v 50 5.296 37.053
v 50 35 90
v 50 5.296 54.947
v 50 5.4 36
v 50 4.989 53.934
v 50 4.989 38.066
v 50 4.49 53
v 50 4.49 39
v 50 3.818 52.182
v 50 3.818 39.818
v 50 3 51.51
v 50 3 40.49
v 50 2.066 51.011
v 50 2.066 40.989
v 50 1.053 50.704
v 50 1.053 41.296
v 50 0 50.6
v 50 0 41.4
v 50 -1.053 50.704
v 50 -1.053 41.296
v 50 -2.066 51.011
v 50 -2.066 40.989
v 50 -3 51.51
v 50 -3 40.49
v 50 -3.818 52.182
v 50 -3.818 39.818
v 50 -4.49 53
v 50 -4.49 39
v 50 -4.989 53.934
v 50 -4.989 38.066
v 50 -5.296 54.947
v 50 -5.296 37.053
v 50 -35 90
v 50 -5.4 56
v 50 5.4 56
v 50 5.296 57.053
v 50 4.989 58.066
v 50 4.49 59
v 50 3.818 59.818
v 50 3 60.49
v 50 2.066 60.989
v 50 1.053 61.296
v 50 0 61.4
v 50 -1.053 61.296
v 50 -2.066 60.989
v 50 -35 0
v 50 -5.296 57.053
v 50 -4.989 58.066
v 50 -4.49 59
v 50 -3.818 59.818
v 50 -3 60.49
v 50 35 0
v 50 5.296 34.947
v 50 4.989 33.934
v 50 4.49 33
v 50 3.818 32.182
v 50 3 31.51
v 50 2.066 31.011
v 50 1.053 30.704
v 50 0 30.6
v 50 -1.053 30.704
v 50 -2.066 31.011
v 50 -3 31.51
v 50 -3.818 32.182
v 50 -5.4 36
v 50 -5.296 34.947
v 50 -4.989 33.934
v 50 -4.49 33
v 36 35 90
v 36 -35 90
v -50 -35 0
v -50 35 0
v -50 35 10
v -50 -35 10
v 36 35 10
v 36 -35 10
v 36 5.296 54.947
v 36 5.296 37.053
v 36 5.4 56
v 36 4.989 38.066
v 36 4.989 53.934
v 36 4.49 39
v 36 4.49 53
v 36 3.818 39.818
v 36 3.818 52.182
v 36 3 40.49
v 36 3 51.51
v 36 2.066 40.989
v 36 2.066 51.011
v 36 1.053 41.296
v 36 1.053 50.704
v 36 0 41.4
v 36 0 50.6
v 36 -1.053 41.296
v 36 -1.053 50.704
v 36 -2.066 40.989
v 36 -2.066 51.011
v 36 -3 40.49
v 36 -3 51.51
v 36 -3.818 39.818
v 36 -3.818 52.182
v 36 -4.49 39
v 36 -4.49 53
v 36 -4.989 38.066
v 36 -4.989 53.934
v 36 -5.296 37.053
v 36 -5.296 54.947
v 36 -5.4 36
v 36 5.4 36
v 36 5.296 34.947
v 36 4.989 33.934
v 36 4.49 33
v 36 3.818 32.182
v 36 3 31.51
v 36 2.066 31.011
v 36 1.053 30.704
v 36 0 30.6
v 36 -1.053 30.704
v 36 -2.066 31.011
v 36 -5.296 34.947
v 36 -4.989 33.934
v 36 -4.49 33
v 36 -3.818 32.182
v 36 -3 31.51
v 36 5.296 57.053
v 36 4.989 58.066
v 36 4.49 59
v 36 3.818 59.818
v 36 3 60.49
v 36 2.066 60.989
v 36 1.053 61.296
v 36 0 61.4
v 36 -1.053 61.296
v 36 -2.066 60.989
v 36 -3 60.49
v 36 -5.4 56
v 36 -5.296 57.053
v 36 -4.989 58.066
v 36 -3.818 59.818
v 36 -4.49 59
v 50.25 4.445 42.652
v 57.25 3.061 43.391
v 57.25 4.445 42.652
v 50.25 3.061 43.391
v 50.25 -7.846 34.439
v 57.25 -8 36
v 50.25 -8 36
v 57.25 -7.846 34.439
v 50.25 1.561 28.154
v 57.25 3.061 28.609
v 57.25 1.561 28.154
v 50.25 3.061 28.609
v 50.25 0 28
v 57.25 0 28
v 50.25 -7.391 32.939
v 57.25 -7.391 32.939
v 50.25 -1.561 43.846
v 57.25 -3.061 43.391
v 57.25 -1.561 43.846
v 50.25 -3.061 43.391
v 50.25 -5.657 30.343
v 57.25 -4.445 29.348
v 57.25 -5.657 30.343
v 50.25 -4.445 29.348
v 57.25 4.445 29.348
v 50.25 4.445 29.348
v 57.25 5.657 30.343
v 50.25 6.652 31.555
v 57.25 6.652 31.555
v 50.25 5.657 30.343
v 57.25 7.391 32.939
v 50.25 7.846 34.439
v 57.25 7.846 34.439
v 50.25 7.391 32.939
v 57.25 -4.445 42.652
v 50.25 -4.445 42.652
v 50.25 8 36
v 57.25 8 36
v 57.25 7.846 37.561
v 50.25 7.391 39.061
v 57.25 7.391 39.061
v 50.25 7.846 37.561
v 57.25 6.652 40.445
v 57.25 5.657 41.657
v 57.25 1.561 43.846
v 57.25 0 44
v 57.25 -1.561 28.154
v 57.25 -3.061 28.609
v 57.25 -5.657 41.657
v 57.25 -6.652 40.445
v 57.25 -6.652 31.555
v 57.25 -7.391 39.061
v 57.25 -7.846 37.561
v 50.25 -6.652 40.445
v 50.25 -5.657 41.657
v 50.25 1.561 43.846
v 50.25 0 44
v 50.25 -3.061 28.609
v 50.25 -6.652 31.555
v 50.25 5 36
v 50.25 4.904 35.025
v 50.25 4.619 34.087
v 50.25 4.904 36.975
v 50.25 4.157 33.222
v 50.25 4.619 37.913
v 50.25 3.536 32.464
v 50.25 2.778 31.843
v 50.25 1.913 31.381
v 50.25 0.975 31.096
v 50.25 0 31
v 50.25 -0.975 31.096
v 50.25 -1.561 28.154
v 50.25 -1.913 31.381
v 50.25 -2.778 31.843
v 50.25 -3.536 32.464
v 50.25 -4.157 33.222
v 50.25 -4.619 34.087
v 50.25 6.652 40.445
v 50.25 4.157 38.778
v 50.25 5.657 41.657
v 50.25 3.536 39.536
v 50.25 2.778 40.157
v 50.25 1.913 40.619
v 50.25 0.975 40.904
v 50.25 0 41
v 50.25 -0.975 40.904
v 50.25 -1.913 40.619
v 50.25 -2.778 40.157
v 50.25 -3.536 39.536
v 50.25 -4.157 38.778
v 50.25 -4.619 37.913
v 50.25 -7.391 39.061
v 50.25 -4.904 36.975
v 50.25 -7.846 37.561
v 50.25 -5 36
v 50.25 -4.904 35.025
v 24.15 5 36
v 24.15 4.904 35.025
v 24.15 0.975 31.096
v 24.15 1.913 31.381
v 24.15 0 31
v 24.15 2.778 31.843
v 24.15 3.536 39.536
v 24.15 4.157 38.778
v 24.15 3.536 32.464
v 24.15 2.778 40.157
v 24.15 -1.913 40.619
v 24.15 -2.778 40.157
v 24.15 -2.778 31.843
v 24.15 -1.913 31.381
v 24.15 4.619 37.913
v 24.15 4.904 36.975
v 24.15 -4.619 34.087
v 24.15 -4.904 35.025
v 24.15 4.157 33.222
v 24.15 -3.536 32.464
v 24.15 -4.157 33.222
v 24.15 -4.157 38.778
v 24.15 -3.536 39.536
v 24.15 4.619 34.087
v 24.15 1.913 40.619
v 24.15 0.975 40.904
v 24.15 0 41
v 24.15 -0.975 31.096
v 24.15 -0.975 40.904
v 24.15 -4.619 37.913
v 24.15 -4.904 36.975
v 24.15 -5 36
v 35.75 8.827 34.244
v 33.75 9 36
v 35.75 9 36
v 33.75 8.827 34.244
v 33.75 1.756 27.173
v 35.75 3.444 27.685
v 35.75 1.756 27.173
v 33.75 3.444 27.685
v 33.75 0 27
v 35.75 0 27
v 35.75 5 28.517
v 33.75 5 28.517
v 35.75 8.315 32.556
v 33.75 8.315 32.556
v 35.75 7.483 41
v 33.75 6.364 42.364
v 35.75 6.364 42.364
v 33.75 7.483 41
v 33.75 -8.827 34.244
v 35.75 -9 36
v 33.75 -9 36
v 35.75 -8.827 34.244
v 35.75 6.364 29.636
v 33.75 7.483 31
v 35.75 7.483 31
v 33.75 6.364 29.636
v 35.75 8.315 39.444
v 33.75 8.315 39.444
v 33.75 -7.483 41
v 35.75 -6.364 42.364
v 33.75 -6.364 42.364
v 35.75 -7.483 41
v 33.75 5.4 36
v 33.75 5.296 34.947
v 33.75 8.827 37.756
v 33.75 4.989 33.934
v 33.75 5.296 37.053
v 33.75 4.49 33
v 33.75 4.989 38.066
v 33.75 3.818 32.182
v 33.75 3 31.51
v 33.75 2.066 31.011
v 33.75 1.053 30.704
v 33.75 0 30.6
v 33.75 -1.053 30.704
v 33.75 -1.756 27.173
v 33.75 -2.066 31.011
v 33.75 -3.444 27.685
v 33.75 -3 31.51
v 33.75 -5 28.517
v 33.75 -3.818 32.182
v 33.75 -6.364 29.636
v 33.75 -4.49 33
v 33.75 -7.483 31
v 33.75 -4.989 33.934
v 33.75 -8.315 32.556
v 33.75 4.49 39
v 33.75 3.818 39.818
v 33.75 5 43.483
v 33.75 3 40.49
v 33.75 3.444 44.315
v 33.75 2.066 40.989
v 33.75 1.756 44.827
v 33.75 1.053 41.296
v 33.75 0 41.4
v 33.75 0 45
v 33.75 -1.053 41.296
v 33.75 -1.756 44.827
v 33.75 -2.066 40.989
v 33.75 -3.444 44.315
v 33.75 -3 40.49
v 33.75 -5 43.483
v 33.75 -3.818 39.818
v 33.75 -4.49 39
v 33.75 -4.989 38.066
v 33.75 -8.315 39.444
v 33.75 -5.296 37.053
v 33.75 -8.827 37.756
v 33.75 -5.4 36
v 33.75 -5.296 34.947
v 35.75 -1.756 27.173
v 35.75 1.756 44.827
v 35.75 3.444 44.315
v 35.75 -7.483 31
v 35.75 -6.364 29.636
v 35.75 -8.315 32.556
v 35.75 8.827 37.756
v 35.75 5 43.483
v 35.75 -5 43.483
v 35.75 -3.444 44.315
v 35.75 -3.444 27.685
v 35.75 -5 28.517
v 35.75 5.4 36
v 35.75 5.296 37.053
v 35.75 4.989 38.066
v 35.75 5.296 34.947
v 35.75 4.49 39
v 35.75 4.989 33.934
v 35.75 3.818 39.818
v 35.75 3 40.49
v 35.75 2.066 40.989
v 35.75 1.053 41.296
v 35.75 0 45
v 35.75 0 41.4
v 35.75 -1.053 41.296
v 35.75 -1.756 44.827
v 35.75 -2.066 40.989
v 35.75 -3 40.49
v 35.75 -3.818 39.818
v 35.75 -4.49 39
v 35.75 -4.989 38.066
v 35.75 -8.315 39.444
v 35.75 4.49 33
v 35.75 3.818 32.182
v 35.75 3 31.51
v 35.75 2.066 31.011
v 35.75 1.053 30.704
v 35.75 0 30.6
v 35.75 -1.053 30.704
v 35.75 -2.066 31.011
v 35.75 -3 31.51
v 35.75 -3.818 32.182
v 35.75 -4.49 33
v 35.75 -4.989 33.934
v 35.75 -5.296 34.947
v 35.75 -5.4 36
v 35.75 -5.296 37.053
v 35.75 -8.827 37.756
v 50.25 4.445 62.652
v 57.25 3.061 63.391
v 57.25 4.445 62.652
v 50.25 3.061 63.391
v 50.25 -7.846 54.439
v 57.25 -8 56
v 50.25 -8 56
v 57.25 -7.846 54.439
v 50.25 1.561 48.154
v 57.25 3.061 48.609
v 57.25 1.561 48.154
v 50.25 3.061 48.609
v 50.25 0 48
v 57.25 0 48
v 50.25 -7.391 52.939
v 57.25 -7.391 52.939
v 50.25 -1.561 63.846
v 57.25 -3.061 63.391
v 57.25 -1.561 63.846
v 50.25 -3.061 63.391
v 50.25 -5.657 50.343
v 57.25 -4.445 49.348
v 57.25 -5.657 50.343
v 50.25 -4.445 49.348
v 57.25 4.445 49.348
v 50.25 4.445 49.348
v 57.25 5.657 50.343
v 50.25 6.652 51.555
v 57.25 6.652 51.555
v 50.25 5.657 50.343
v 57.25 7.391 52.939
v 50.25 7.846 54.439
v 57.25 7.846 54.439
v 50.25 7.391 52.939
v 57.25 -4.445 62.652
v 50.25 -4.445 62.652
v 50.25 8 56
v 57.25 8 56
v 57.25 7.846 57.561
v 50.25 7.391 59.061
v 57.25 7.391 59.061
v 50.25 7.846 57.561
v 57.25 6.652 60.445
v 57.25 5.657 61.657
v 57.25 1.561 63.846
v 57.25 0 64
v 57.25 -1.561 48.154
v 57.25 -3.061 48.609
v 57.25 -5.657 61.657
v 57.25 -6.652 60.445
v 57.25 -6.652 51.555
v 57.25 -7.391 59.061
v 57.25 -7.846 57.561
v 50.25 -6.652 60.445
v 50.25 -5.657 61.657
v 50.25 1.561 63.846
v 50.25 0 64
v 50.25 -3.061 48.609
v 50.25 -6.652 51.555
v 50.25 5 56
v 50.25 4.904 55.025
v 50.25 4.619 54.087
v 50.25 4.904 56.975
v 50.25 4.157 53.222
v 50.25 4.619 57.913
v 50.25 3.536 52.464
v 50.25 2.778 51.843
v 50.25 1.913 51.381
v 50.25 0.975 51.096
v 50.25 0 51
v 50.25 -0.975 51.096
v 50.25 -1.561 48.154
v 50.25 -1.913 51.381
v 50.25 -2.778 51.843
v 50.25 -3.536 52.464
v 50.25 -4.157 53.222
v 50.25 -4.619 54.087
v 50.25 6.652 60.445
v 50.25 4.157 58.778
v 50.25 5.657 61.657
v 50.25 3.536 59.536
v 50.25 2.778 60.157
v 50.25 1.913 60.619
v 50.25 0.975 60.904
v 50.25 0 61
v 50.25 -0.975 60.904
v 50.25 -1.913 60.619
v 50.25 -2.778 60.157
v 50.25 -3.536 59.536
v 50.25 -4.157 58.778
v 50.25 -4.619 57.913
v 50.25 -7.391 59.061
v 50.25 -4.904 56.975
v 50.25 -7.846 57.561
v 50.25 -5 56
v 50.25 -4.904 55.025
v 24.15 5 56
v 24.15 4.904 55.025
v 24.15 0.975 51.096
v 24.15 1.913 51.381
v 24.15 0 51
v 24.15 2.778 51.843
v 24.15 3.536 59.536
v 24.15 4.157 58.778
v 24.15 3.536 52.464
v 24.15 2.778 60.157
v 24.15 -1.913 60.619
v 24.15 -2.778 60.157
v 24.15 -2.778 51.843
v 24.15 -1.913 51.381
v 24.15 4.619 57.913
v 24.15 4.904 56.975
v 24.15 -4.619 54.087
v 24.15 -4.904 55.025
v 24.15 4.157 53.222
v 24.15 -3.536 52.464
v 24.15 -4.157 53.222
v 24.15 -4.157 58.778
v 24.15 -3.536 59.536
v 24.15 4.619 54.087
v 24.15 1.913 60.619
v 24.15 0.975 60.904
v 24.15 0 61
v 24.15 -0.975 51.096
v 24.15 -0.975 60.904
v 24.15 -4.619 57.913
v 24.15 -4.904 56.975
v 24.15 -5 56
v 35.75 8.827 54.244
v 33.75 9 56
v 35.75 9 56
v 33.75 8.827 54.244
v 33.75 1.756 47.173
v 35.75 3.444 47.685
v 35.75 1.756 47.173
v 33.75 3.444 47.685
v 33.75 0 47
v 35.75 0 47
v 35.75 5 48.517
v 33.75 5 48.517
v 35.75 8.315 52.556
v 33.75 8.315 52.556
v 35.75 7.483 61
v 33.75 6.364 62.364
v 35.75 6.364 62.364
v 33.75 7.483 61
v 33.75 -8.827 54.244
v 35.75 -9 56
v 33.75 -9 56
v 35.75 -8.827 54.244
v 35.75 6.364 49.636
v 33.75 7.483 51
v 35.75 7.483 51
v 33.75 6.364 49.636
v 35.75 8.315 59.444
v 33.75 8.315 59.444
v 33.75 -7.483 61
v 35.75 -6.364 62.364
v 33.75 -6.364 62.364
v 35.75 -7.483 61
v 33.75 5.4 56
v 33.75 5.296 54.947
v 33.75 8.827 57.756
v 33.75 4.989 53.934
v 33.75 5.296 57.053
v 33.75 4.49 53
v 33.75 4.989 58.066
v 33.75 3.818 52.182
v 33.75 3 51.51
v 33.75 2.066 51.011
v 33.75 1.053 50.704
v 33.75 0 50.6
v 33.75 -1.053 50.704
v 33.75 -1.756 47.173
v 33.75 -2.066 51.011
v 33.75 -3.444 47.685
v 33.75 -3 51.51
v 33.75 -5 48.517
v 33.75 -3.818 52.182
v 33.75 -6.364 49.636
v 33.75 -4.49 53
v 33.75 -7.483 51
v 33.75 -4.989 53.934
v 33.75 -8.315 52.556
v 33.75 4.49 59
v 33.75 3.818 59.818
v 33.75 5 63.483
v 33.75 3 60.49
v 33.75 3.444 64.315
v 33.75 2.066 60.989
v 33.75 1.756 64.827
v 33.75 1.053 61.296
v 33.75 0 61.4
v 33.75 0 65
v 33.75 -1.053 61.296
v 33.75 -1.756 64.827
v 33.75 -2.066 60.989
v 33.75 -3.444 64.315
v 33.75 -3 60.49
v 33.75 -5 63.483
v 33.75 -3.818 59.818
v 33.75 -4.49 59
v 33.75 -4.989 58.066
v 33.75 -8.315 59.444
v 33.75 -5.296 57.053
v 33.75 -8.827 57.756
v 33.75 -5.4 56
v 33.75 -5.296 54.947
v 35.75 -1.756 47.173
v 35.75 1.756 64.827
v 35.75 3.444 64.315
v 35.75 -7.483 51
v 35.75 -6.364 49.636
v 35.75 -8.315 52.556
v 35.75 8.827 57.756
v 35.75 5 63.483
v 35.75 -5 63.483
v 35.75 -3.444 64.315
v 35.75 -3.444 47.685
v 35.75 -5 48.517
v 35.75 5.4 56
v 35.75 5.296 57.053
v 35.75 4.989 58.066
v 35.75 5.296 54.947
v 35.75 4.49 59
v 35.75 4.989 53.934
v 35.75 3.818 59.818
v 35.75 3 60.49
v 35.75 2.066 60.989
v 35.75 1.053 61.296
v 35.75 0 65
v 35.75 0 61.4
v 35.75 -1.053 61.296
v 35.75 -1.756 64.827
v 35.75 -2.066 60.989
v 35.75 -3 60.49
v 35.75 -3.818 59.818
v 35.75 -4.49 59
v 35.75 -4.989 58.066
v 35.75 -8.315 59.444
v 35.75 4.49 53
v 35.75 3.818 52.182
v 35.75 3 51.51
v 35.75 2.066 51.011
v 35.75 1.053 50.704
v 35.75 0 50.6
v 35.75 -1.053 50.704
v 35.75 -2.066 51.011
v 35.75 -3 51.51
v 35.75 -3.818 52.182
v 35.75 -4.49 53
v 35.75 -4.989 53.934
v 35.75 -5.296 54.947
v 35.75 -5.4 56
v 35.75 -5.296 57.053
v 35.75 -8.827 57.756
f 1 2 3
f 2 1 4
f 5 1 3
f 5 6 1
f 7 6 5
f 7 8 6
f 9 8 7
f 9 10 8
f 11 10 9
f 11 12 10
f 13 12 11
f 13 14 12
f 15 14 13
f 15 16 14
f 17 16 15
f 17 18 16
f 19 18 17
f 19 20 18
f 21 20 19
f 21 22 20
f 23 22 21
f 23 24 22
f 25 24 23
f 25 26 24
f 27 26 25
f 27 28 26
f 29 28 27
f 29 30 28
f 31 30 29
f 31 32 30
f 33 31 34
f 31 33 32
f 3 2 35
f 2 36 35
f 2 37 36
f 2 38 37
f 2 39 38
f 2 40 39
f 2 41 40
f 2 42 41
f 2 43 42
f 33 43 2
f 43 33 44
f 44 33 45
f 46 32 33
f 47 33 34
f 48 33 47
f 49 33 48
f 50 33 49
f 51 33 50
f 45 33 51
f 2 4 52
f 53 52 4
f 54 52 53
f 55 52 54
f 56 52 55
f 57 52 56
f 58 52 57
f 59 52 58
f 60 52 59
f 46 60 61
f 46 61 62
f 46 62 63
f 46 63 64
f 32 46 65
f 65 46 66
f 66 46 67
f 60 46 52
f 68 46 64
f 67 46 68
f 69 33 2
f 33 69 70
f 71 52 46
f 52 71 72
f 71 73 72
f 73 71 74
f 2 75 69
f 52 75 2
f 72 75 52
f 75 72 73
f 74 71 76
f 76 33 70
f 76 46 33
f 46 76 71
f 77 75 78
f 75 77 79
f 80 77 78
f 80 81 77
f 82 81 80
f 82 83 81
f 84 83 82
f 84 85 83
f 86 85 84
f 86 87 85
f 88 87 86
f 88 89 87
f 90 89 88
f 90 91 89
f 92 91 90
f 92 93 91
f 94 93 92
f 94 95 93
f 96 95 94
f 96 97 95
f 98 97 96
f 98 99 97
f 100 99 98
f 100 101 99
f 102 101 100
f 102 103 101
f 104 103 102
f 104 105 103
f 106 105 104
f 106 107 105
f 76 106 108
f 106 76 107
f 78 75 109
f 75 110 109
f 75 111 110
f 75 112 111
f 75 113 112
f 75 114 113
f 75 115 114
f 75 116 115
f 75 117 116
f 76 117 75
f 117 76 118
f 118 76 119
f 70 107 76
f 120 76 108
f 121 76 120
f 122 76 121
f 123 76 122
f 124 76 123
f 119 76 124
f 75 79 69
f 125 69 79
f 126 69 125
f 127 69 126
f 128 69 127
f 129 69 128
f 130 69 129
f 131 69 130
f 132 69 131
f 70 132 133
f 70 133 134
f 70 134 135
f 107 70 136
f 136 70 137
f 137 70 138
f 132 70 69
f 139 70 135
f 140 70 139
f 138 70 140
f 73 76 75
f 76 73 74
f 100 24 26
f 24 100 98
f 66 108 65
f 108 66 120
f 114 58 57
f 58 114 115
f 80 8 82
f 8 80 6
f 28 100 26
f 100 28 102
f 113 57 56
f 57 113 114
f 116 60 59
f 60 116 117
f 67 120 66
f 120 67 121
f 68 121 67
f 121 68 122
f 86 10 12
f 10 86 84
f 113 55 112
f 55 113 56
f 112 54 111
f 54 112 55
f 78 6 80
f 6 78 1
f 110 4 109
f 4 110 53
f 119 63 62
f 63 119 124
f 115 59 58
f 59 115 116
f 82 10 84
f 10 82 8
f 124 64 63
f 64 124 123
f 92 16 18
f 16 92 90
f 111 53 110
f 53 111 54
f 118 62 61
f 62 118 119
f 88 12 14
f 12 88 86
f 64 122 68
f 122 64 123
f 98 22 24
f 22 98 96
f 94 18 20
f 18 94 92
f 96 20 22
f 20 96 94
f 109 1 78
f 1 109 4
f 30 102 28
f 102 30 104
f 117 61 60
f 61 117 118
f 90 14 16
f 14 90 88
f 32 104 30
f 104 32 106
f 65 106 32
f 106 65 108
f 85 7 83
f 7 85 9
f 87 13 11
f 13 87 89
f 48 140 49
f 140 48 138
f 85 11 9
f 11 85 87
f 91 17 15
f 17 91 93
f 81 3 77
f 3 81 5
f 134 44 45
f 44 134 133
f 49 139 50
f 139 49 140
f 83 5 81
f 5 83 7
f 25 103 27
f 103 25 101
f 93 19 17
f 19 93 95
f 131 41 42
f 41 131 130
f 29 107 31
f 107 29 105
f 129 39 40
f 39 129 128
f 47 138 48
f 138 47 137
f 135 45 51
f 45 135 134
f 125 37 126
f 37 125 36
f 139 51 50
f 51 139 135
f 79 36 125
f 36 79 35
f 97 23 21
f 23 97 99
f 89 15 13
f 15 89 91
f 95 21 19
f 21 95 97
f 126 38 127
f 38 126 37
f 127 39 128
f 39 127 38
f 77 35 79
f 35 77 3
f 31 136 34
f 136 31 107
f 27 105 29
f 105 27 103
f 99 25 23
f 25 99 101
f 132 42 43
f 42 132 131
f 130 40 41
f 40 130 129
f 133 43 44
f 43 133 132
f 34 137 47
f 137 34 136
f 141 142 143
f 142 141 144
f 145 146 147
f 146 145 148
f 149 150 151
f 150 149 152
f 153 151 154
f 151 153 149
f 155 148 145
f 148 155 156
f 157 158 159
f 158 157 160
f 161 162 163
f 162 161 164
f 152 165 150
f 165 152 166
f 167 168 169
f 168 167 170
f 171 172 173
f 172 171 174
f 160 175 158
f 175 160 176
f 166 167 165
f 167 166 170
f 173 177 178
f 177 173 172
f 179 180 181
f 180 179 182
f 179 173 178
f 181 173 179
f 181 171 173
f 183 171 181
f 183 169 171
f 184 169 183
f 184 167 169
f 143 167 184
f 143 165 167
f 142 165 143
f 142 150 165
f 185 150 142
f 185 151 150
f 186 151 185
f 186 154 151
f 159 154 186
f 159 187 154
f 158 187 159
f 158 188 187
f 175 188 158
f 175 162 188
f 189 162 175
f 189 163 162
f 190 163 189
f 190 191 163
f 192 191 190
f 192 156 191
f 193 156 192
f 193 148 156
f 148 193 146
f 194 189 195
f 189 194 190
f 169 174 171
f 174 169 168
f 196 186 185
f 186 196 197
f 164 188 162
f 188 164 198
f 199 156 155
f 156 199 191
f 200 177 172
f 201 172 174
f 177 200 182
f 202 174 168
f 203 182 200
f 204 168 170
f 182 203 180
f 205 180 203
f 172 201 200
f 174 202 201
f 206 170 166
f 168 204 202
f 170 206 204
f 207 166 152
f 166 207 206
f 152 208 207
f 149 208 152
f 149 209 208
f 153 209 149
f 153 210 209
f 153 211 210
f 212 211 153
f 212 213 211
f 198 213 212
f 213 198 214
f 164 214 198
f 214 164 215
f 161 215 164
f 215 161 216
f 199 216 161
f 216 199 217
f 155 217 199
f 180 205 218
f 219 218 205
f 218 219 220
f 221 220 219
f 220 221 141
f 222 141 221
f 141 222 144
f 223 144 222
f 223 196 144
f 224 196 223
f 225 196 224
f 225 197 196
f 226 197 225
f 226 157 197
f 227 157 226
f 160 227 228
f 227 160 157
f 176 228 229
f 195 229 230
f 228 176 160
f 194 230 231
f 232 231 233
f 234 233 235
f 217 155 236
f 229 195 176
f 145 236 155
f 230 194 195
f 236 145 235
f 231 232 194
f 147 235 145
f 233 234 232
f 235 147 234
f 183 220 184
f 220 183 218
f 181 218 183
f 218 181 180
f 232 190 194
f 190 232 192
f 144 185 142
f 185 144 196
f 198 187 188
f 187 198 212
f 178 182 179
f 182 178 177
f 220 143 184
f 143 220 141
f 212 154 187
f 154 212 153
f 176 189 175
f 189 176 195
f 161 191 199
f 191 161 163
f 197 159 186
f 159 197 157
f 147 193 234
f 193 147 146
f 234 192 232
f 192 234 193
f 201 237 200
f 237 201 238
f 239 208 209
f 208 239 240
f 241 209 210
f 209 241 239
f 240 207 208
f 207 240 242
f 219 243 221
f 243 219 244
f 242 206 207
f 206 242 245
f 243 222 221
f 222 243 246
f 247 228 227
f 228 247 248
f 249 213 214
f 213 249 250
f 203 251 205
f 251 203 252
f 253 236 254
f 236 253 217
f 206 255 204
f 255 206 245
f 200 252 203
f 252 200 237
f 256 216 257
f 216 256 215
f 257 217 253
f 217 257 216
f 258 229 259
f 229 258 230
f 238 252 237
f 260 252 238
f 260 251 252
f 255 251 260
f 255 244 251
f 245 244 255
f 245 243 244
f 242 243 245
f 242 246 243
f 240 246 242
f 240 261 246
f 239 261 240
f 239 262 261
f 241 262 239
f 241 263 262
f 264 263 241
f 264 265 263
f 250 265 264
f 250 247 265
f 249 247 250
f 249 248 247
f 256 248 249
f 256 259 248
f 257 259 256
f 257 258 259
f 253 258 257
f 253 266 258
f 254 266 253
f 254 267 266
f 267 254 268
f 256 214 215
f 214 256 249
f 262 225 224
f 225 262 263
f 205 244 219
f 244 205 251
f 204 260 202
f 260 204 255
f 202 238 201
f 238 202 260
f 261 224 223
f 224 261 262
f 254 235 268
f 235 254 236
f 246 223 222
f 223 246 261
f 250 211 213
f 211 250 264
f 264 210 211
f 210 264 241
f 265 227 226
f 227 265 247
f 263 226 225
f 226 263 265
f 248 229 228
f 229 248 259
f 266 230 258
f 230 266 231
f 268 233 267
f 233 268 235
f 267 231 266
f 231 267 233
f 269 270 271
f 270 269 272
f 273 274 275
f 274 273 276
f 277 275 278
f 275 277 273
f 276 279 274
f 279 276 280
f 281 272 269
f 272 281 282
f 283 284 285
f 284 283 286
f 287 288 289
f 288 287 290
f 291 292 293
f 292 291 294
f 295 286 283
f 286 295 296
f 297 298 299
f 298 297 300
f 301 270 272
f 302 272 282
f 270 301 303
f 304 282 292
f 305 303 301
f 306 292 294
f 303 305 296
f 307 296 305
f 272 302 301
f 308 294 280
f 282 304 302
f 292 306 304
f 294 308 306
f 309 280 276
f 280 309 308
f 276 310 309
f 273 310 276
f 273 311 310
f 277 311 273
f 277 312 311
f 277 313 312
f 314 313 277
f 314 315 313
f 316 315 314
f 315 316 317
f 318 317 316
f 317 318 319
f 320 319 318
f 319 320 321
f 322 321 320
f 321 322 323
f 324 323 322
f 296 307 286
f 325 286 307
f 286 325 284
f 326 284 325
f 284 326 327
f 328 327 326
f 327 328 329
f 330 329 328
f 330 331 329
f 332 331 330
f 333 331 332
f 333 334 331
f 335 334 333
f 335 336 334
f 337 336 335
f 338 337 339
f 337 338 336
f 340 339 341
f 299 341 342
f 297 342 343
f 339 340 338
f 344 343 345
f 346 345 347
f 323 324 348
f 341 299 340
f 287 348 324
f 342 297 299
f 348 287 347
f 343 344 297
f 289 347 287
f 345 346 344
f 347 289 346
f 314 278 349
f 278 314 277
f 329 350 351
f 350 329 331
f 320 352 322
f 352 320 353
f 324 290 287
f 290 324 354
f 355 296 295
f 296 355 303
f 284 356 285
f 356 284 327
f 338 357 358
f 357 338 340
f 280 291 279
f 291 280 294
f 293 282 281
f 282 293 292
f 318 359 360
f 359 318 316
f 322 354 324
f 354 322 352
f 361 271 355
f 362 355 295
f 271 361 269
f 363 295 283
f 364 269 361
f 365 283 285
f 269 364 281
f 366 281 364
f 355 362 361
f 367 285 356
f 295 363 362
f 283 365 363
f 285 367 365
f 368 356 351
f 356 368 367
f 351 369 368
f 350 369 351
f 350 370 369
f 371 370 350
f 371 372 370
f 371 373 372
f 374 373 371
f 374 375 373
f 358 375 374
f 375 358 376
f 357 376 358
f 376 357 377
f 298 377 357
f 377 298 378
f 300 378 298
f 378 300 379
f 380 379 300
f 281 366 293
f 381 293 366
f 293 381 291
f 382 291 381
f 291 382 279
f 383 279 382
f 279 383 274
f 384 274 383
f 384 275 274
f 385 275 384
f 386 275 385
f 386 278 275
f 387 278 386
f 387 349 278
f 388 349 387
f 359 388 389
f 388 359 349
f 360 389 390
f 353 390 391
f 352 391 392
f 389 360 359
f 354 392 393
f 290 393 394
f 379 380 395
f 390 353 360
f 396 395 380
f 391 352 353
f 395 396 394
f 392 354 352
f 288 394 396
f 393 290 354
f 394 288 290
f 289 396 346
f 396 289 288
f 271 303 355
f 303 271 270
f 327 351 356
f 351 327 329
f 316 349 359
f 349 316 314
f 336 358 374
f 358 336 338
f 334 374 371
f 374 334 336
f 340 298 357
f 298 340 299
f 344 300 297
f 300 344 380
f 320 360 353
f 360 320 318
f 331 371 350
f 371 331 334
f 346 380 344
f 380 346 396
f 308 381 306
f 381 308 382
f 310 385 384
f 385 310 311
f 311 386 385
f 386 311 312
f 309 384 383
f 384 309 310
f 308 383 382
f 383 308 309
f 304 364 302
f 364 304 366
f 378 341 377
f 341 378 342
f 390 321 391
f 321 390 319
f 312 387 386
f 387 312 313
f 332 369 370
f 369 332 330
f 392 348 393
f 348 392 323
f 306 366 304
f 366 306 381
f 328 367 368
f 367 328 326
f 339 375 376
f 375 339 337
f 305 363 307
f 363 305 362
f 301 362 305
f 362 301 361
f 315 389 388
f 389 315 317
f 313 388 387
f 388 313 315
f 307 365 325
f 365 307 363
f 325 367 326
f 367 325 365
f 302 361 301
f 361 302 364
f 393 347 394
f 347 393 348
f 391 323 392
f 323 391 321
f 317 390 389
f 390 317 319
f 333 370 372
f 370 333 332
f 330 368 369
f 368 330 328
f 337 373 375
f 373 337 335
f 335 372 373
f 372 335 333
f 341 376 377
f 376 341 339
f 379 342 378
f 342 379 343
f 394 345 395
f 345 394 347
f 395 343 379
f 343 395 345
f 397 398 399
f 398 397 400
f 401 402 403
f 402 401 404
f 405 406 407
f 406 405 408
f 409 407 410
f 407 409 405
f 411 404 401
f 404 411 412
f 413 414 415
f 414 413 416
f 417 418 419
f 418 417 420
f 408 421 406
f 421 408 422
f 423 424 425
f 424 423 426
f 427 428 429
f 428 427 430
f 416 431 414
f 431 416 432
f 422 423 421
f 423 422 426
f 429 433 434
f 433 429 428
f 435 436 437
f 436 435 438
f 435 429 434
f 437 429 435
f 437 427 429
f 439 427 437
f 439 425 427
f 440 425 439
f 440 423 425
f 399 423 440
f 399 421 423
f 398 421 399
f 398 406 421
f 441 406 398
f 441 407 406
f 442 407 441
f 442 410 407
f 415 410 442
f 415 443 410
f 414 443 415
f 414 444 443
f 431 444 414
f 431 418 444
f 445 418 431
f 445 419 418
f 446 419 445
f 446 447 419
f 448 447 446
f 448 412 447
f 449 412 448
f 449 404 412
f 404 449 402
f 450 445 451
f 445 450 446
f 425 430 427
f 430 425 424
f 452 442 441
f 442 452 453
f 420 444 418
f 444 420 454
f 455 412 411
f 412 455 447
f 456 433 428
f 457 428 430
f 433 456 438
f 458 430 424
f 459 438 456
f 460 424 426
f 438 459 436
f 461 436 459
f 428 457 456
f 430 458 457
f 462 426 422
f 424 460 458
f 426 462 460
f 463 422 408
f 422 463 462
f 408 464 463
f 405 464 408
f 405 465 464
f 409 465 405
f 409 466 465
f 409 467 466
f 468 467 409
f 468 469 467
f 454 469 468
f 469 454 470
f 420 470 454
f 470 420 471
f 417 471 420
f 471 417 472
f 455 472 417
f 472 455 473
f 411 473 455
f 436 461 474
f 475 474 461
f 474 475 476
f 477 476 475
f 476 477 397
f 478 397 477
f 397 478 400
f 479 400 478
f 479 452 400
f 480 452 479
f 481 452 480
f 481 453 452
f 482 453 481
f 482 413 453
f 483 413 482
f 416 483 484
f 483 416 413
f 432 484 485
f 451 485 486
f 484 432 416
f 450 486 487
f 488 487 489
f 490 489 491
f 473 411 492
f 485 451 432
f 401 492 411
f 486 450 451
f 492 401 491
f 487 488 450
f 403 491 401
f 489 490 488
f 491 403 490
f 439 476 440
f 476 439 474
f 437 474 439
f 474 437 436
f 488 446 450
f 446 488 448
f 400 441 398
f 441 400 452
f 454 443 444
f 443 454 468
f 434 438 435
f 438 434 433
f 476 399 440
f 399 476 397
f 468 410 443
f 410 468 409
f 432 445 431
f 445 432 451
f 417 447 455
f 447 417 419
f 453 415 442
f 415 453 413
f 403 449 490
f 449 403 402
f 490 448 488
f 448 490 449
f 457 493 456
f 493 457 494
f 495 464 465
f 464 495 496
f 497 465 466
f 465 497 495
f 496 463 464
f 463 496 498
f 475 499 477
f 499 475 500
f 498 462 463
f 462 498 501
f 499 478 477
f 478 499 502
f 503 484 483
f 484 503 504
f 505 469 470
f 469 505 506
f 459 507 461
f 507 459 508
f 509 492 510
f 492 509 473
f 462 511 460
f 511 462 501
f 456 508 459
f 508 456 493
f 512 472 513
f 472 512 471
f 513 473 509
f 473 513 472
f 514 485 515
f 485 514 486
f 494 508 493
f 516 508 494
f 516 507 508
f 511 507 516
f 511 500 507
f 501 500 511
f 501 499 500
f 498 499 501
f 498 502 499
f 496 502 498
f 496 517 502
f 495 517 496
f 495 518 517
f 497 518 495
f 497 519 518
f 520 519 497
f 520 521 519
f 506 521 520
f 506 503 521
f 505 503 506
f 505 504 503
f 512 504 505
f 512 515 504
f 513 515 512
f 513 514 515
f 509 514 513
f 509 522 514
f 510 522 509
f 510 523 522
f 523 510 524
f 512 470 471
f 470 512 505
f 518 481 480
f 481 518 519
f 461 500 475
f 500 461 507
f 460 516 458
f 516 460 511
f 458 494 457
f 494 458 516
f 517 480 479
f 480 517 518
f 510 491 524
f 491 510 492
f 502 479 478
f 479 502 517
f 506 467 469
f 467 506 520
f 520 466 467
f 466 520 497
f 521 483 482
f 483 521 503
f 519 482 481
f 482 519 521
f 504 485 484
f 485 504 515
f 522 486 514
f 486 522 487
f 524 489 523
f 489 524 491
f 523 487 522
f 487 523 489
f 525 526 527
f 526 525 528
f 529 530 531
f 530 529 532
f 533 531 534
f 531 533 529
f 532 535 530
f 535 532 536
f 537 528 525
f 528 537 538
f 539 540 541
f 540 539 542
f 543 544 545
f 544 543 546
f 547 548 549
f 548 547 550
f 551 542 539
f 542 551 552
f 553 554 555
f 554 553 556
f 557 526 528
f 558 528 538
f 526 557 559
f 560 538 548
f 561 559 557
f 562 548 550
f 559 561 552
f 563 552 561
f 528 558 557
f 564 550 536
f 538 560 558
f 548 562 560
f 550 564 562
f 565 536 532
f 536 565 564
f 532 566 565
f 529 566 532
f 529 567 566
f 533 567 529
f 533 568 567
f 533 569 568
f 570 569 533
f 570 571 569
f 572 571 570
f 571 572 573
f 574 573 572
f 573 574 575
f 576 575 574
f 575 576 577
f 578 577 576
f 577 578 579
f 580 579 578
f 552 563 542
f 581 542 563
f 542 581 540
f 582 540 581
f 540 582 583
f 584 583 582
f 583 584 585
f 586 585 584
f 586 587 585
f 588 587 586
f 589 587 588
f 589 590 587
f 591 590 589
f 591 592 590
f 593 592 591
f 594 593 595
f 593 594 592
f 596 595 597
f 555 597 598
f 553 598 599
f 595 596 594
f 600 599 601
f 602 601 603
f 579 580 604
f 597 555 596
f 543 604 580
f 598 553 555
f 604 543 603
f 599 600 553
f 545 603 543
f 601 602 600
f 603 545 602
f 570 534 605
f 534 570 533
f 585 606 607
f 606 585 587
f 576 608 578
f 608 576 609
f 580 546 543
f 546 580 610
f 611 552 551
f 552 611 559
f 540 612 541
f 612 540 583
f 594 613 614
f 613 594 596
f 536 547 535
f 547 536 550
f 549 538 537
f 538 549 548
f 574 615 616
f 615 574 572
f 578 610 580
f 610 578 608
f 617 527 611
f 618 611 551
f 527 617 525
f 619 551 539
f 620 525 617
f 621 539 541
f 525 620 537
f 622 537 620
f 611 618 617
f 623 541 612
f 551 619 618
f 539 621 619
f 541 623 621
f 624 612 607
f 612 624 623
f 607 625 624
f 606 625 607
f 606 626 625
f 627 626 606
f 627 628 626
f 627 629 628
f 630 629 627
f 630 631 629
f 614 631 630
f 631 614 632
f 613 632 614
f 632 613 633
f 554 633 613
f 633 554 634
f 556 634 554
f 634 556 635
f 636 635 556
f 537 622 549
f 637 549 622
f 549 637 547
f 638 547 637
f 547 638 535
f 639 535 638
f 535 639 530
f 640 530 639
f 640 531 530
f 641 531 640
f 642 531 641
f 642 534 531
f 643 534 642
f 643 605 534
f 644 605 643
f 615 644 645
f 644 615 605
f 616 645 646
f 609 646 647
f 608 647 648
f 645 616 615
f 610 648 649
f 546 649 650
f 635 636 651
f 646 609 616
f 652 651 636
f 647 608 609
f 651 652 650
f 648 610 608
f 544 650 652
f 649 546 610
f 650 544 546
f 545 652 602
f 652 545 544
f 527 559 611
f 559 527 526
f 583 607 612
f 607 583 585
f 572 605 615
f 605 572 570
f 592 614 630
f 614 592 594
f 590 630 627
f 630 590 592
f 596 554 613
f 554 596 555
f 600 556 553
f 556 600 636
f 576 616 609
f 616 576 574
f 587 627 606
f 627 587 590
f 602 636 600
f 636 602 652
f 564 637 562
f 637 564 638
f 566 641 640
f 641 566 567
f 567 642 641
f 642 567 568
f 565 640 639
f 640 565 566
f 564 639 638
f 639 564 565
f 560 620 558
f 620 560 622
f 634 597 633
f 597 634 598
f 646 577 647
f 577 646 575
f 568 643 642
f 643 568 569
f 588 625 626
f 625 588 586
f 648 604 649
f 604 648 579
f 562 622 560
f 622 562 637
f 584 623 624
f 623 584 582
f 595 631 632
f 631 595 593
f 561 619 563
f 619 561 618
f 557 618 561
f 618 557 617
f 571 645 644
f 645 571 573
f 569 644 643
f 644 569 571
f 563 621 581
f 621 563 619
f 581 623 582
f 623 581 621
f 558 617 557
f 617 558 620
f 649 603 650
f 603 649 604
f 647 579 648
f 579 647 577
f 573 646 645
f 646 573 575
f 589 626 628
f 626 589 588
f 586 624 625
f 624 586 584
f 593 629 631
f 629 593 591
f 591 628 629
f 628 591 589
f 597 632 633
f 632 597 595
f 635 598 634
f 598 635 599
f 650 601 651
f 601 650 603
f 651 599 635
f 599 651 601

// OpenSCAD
$fn = 32;

// ------------------------------------------------------------------------
// Bolted bracket: 100 x 70 mm bracket with 2 bolt joints
// Every part is its own module, assembly() places them once.
// ------------------------------------------------------------------------

// --- part 1 ---
module bracket() {
  difference() {
    translate([-50, -35, 0]) cube([100, 70, 90]);
    translate([-51, -36, 10]) cube([87, 72, 81]);
    translate([43, 0, 36]) rotate([0, 90, 0]) cylinder(h = 16, d = 10.8, center = true);
    translate([43, 0, 56]) rotate([0, 90, 0]) cylinder(h = 16, d = 10.8, center = true);
  }
}

// --- part 2 ---
module bolt1() {
  cylinder(h = 7, d = 16);
  translate([0, 0, -26.1]) cylinder(h = 26.1, d = 10);
}

// --- part 3 ---
module washer1() {
  difference() {
      translate([0, 0, 0]) cylinder(h = 2, d = 18);
      translate([0, 0, -1]) cylinder(h = 4, d = 10.8);
    }
}

// --- part 4 ---
module bolt2() {
  cylinder(h = 7, d = 16);
  translate([0, 0, -26.1]) cylinder(h = 26.1, d = 10);
}

// --- part 5 ---
module washer2() {
  difference() {
      translate([0, 0, 0]) cylinder(h = 2, d = 18);
      translate([0, 0, -1]) cylinder(h = 4, d = 10.8);
    }
}

// --- assembly ---
module assembly() {
  translate([0, 0, 0]) rotate([0, 0, 0]) bracket();
  translate([50.25, 0, 36]) rotate([0, 90, 0]) bolt1();
  translate([33.75, 0, 36]) rotate([0, 90, 0]) washer1();
  translate([50.25, 0, 56]) rotate([0, 90, 0]) bolt2();
  translate([33.75, 0, 56]) rotate([0, 90, 0]) washer2();
}

assembly();
